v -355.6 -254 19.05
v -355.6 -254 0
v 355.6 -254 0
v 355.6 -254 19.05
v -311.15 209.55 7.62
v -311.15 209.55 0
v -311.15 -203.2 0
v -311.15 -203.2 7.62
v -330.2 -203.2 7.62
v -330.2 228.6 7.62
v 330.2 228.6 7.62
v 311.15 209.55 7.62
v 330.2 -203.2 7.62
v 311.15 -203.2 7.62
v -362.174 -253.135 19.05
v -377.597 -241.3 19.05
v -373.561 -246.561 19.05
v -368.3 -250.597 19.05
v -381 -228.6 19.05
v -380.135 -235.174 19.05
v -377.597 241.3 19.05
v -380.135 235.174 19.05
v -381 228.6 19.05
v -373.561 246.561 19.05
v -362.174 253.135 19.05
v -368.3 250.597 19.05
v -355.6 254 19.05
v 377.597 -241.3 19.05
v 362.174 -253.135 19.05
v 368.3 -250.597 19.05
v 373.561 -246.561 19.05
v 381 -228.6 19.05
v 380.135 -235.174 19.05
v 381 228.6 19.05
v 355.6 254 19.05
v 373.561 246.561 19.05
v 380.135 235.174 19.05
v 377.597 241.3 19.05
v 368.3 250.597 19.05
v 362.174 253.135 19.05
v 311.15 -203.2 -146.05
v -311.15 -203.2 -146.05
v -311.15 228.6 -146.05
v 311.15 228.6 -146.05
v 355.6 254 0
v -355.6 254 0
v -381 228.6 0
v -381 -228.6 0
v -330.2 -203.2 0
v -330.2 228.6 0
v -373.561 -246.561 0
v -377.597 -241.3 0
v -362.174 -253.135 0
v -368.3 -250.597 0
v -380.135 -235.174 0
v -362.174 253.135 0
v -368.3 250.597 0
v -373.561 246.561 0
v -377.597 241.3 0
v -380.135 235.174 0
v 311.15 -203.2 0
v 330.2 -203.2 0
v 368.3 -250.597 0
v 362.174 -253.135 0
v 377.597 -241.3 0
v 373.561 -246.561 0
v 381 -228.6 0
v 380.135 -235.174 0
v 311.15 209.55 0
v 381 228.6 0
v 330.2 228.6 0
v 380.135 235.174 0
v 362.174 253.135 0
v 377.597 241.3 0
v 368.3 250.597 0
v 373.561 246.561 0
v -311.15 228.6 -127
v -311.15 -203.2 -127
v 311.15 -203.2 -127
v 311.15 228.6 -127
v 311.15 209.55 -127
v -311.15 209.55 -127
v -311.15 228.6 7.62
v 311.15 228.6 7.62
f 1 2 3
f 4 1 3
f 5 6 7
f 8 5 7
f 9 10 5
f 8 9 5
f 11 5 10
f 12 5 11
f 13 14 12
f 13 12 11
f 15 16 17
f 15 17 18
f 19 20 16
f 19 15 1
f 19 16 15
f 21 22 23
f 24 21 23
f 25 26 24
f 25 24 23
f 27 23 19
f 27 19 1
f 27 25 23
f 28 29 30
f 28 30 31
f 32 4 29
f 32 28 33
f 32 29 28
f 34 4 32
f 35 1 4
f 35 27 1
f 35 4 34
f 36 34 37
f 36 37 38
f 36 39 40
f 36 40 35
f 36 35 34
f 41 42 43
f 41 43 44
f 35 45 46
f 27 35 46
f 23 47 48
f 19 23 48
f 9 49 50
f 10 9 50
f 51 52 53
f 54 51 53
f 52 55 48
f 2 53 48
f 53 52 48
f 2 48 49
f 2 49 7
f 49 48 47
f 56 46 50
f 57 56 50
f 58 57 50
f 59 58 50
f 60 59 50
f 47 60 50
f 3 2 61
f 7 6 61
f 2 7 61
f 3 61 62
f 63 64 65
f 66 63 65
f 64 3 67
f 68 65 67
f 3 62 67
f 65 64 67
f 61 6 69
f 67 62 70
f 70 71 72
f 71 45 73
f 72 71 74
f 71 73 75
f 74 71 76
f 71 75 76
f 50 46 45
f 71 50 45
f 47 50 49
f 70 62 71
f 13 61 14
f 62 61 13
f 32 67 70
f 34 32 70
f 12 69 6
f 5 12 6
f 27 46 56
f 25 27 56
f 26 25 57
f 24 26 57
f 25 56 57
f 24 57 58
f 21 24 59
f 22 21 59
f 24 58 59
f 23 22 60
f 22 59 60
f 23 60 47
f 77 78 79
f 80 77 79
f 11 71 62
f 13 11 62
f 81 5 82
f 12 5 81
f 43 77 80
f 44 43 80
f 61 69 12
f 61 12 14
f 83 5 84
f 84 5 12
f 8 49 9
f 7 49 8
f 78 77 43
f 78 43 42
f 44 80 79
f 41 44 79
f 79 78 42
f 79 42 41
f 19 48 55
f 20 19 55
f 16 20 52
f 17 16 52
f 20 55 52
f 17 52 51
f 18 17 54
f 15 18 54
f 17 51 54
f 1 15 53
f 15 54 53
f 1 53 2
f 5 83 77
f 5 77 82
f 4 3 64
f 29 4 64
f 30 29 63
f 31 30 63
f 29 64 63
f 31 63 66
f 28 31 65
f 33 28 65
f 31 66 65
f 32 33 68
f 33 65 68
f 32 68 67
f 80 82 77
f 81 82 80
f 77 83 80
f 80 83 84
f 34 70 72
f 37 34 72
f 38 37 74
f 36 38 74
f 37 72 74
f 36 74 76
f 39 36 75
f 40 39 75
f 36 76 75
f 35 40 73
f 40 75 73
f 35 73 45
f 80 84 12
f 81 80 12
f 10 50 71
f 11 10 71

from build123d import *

# Parameters (mm, degrees)
F1_DEPTH = 19.05
F2_W     = 19.05
F2_H     = 412.75
F3_DEPTH = 7.62
F4_W     = 622.3
F4_H     = 19.05
F5_DEPTH = 134.62
F6_W     = 622.3
F6_H     = 431.8
F7_DEPTH = 19.05


with BuildPart() as f1:
    # F0 (on Top) → F1 (new body)
    with BuildSketch(Plane.XY):
        with BuildLine():
            Line((355.6, 254), (-355.6, 254))
            ThreePointArc((-355.6, 254), (-373.560512, 246.560512), (-381, 228.6))
            Line((-381, 228.6), (-381, -228.6))
            ThreePointArc((-381, -228.6), (-373.560512, -246.560512), (-355.6, -254))
            Line((-355.6, -254), (355.6, -254))
            ThreePointArc((355.6, -254), (373.560512, -246.560512), (381, -228.6))
            Line((381, -228.6), (381, 228.6))
            ThreePointArc((381, 228.6), (373.560512, 246.560512), (355.6, 254))
        make_face()
    extrude(amount=F1_DEPTH)

    # F2 (on face) → F3 (cut)
    with BuildSketch(Plane(origin=(0, 0, 0), x_dir=(1, 0, 0), z_dir=(0, 0, -1))):
        Polygon((-330.2, -228.6), (330.2, -228.6), (330.2, -209.55), (311.15, -209.55), (-311.15, -209.55), (-330.2, -209.55), align=None)
        with Locations((320.675, -3.175)):
            Rectangle(F2_W, F2_H)
        with Locations((-320.675, -3.175)):
            Rectangle(F2_W, F2_H)
    extrude(amount=-F3_DEPTH, mode=Mode.SUBTRACT)


with BuildPart() as f5:
    # F4 (on face) → F5 (new body)
    with BuildSketch(Plane(origin=(0, 0, 7.62), x_dir=(1, 0, 0), z_dir=(0, 0, -1))):
        with Locations((0, -219.075)):
            Rectangle(F4_W, F4_H)
    extrude(amount=F5_DEPTH)


with BuildPart() as f7:
    # F6 (on face) → F7 (new body)
    with BuildSketch(Plane(origin=(0, 0, -127), x_dir=(1, 0, 0), z_dir=(0, 0, -1))):
        with Locations((0, -12.7)):
            Rectangle(F6_W, F6_H)
    extrude(amount=F7_DEPTH)


solid = Compound([f1.part, f5.part, f7.part])
